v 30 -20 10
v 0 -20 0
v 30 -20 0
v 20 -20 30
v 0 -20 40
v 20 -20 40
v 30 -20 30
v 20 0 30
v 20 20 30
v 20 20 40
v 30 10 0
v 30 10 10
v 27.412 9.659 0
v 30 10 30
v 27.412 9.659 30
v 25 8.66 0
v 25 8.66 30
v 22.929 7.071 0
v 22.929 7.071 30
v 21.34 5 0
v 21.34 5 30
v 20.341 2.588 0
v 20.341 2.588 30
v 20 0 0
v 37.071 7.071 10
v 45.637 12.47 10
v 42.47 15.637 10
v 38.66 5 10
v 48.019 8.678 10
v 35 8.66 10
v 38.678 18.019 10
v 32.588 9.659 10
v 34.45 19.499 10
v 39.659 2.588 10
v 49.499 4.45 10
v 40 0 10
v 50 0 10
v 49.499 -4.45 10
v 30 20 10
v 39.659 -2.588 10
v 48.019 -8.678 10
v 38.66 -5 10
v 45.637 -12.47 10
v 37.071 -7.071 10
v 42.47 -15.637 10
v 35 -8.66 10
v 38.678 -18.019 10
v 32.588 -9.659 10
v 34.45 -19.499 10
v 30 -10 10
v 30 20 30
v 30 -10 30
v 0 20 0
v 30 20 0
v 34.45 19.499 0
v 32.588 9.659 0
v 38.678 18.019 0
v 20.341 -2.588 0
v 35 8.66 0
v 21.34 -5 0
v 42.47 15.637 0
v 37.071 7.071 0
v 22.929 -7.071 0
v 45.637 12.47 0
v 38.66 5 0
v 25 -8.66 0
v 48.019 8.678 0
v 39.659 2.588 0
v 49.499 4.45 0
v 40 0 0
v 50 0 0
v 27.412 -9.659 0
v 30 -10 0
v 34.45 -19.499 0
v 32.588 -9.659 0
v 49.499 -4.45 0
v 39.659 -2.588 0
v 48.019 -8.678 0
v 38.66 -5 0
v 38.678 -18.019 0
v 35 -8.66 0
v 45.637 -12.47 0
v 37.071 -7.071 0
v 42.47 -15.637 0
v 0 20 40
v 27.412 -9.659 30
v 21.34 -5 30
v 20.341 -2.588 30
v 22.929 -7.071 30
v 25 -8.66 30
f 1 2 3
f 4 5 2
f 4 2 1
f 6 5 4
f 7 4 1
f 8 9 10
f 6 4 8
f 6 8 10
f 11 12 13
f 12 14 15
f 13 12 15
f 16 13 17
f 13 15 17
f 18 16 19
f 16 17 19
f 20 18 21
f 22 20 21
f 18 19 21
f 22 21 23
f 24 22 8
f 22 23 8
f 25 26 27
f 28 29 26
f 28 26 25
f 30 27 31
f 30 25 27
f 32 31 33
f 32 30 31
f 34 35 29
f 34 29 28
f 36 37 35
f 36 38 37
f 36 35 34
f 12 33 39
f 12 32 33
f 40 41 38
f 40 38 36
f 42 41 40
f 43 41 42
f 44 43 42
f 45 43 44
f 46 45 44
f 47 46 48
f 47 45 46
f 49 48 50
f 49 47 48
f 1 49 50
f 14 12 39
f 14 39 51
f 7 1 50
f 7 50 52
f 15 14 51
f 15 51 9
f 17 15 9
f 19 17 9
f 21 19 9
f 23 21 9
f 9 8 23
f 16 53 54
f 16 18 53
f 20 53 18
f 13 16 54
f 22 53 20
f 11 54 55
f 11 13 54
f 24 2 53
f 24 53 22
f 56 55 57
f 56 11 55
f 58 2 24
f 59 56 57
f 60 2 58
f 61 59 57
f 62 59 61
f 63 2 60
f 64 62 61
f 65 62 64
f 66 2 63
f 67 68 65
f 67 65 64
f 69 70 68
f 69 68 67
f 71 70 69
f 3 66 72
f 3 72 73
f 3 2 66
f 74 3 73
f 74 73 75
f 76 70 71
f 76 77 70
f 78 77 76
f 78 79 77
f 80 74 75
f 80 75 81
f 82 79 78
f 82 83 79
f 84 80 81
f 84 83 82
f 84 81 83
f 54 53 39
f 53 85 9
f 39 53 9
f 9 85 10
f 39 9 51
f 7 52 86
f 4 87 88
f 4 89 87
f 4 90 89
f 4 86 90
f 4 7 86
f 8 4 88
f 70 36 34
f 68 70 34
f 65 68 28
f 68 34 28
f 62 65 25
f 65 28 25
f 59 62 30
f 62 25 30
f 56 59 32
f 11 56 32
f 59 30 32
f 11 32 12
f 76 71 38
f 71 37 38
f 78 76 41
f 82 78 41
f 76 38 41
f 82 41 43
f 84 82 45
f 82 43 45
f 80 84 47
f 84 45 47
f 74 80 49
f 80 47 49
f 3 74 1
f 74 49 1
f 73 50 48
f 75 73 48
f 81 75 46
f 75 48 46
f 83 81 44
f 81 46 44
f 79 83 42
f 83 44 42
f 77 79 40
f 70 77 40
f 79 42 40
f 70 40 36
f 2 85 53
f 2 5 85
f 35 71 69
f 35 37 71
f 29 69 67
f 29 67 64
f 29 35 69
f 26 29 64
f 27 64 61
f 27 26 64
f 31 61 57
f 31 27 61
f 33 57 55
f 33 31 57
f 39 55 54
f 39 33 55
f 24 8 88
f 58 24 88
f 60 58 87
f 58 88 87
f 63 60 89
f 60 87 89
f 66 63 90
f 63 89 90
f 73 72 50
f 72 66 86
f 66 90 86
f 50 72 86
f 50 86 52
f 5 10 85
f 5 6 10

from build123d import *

# Parameters (mm, degrees)
F1_DEPTH = 20
F2_R     = 19.99999
F4_DEPTH = 30.001


# Not quite as in the source:
# - a fillet or chamfer is up to 0.001 mm smaller than in the source, because OpenCascade refuses the exact size


with BuildPart() as f1:
    # F0 (on Front) → F1 (new body, symmetric)
    with BuildSketch(Plane.XZ):
        Polygon((0, 40), (0, 0), (50, 0), (50, 10), (30, 10), (30, 30), (20, 30), (20, 40), align=None)
    extrude(amount=F1_DEPTH, both=True)

    # F2 (radius 20 in the source; OpenCascade refuses exactly that, so slightly less here)
    f2_edges = [f1.edges().sort_by_distance(p)[0] for p in [
        (50, -20, 5),
        (50, 20, 5),
    ]]
    fillet(f2_edges, radius=F2_R)

    # F3 (on face) → F4 (cut, through all)
    with BuildSketch(Plane.XY.offset(30)):
        with BuildLine():
            Line((30, -10), (30, 10))
            ThreePointArc((30, 10), (22.9289321778, 7.0710678016), (20, -2.91e-08))
            ThreePointArc((20, -2.91e-08), (22.9289321984, -7.0710678222), (30, -10))
        make_face()
        with BuildLine():
            ThreePointArc((30, -10), (37.0710678119, -7.0710678119), (40, 0))
            ThreePointArc((40, 0), (37.0710678119, 7.0710678119), (30, 10))
            Line((30, 10), (30, -10))
        make_face()
    extrude(amount=-F4_DEPTH, mode=Mode.SUBTRACT)


solid = f1.part
